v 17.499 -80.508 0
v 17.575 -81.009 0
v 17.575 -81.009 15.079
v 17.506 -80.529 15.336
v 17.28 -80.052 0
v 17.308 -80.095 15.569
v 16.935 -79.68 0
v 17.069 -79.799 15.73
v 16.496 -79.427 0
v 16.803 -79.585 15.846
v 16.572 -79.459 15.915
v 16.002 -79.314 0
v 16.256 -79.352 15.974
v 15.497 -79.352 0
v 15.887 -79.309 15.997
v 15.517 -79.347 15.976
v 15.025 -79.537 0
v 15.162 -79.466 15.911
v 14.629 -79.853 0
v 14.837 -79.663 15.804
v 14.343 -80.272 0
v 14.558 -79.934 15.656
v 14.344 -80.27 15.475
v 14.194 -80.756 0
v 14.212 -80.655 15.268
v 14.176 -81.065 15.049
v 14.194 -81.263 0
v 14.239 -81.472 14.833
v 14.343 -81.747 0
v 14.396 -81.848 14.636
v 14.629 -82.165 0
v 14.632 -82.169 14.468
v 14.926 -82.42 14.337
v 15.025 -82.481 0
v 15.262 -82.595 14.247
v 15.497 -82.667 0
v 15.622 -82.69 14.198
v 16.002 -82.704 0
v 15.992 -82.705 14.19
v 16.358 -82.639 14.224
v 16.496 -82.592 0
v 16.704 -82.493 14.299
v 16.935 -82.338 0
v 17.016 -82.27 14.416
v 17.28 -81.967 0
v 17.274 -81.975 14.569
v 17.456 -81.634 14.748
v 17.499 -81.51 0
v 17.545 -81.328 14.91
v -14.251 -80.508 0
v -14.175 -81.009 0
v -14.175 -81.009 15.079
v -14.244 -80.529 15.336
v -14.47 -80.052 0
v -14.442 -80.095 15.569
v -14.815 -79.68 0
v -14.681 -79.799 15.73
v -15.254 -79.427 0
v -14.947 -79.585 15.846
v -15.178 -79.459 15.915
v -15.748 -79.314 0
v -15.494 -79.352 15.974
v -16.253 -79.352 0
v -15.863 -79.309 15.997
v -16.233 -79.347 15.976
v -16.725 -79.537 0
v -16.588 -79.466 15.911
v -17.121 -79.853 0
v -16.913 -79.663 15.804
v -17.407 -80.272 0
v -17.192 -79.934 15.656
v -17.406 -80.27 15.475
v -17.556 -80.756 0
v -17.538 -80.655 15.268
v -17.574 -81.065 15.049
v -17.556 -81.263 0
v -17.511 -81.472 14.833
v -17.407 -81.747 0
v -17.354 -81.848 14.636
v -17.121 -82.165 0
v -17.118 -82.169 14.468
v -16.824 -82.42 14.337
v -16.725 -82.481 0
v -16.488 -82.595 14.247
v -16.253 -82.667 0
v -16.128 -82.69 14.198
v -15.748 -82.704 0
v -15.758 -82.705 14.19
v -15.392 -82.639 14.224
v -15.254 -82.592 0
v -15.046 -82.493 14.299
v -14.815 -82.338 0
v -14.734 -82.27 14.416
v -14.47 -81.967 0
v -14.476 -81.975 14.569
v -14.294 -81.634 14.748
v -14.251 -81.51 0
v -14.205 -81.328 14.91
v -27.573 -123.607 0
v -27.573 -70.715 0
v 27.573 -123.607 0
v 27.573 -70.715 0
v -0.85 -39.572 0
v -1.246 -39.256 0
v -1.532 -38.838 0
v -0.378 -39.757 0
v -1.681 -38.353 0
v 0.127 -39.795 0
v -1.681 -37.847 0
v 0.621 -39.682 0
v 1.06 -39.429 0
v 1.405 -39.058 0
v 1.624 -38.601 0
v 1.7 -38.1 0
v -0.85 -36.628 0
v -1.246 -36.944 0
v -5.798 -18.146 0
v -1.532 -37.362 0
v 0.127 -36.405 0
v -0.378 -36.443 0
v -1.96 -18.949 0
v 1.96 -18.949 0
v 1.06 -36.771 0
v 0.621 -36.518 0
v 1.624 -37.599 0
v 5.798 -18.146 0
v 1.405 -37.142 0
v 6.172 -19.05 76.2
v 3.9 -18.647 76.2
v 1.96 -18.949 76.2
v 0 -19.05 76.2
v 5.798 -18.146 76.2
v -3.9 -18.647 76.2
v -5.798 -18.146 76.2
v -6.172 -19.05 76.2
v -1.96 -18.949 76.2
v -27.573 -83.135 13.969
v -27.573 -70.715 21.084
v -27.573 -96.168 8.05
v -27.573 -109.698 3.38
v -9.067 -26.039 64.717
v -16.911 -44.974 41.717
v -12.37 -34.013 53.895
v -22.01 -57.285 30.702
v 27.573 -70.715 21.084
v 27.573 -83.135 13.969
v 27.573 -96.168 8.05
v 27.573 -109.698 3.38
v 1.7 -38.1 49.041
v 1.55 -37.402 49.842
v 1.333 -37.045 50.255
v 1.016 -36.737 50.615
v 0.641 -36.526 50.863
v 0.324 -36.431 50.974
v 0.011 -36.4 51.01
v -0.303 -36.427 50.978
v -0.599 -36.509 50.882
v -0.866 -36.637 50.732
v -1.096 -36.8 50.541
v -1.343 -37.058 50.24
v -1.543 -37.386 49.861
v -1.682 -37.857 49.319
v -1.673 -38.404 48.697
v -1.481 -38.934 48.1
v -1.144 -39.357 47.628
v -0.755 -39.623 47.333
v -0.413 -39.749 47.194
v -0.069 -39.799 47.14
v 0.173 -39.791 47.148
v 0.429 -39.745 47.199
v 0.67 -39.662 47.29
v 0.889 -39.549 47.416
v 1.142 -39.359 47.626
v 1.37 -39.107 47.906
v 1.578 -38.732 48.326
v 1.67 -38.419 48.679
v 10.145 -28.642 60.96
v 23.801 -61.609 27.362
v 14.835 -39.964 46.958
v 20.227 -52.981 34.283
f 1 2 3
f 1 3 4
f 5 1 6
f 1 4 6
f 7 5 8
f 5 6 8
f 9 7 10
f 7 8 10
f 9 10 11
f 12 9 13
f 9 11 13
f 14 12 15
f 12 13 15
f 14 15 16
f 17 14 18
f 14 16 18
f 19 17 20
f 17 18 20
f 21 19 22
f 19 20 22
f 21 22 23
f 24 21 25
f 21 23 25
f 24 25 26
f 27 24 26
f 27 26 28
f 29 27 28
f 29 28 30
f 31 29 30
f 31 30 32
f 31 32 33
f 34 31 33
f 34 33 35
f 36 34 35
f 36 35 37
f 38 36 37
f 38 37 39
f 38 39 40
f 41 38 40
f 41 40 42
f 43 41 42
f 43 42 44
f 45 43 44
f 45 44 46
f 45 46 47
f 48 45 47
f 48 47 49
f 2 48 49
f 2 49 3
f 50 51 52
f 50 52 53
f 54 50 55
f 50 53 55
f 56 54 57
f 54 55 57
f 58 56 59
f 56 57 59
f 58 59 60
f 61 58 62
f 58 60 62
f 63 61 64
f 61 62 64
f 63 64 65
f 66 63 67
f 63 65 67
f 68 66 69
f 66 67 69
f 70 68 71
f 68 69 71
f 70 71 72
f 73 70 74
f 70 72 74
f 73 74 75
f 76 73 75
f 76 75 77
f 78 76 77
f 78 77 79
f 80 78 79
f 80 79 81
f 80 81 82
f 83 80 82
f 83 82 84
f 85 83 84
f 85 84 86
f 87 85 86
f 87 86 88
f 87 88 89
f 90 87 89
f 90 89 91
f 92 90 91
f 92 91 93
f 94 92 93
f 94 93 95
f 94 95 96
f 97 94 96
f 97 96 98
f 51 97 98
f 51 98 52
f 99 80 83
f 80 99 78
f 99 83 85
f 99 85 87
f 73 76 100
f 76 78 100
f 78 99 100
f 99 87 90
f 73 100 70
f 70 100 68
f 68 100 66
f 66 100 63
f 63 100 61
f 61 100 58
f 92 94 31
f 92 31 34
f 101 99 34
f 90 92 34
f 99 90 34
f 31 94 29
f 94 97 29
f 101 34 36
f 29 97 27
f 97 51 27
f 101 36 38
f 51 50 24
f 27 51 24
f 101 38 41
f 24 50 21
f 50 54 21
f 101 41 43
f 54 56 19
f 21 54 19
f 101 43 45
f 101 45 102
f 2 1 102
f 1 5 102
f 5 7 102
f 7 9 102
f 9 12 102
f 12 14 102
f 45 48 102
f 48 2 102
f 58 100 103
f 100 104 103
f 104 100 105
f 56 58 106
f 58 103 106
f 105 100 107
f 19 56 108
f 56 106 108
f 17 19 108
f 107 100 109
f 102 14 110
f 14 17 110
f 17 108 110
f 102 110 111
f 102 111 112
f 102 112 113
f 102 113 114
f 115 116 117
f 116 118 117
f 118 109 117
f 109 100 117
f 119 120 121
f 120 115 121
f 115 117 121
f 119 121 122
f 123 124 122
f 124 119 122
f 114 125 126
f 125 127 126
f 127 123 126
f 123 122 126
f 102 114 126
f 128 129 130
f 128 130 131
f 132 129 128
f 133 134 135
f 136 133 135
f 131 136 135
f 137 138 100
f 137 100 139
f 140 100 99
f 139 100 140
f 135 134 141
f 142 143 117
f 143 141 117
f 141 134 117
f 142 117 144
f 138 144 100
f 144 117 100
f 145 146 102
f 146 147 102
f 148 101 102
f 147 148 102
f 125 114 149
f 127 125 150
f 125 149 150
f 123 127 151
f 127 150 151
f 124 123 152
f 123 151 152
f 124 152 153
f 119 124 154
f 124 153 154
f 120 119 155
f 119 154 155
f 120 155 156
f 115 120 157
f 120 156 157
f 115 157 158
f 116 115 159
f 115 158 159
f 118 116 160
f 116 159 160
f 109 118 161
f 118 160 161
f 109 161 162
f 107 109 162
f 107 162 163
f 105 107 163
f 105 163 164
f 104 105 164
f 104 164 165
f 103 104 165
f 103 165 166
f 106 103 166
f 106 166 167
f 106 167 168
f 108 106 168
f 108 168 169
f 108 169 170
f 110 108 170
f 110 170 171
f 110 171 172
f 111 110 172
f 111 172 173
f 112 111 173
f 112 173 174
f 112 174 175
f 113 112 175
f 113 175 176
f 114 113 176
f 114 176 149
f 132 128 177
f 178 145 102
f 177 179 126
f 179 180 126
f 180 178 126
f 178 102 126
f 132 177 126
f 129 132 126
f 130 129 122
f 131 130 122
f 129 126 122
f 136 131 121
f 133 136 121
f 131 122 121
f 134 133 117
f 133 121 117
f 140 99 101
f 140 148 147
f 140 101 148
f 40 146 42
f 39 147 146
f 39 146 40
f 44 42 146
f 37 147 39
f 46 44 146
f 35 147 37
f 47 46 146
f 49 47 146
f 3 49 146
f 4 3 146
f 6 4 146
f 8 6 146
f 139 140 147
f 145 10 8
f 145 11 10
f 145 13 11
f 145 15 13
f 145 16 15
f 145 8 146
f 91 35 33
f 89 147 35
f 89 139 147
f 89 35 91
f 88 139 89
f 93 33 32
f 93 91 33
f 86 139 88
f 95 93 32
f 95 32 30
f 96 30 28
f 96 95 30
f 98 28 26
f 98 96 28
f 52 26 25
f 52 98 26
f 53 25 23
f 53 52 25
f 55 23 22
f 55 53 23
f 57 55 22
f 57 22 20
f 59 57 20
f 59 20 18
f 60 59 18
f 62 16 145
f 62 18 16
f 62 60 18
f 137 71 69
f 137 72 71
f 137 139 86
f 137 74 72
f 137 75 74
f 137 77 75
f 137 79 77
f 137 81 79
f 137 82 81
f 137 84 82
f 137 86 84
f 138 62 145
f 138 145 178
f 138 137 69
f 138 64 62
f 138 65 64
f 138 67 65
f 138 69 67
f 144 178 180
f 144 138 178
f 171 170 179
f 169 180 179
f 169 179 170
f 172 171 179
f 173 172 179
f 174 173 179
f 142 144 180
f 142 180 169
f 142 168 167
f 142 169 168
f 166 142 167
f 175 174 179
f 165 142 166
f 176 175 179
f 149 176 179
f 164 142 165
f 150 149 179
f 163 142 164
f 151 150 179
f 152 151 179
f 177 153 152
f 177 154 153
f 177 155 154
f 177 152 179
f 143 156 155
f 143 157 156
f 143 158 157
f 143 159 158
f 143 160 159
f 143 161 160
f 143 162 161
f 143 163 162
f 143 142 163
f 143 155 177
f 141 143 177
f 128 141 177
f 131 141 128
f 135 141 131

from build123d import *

# Parameters (mm, degrees)
BOSS_EXTRUDE1_DEPTH  = 76.2
CUT_EXTRUDE1_START   = -27.572978
CUT_EXTRUDE1_DEPTH   = 55.145956
M3_CLEARANCE_HOLE1_D = 3.4
CUT_EXTRUDE2_REACH   = 149.802
SKETCH10_R           = 19.05


with BuildPart() as part:
    # Sketch1 → Boss-Extrude1 (new body)
    with BuildSketch(Plane.XY):
        Polygon((27.572977546, -123.606903324), (27.572977546, -70.715393761), (0, -4.148337413), (-27.572977546, -70.715393761), (-27.572977546, -123.606903324), align=None)
    extrude(amount=BOSS_EXTRUDE1_DEPTH)

    # Sketch2 → Cut-Extrude1 (cut)
    with BuildSketch(Plane(origin=(0, 0, 0), x_dir=(0, 0, -1), z_dir=(1, 0, 0)).offset(CUT_EXTRUDE1_START)):
        with BuildLine():
            Line((-76.2, -123.606903324), (0, -123.606903324))
            ThreePointArc((0, -123.606903324), (-26.454151539, -62.84107661), (-76.2, -19.05))
            Line((-76.2, -19.05), (-76.2, -70.715393761))
            Line((-76.2, -70.715393761), (-76.2, -123.606903324))
        make_face()
    extrude(amount=CUT_EXTRUDE1_DEPTH, mode=Mode.SUBTRACT)

    # M3 Clearance Hole1 (through all)
    with Locations(Plane(origin=(0, 0, 0), x_dir=(-1, 0, 0), z_dir=(0, 0, -1))):
        with Locations((-15.875, -81.009177721), (15.875, -81.009177721), (0, -38.1)):
            Hole(M3_CLEARANCE_HOLE1_D / 2)

    # Sketch10 → Cut-Extrude2 (cut, up to next)
    with BuildSketch(Plane(origin=(0, 0, 0), x_dir=(-1, 0, 0), z_dir=(0, 0, -1)), mode=Mode.PRIVATE) as cut_extrude2_sk1:
        Circle(SKETCH10_R)
    cut_extrude2_tool1 = extrude(cut_extrude2_sk1.sketch, amount=-CUT_EXTRUDE2_REACH, mode=Mode.PRIVATE) & part.part
    add(cut_extrude2_tool1.solids().sort_by_distance((0, 0, 0))[0], mode=Mode.SUBTRACT)


solid = part.part
